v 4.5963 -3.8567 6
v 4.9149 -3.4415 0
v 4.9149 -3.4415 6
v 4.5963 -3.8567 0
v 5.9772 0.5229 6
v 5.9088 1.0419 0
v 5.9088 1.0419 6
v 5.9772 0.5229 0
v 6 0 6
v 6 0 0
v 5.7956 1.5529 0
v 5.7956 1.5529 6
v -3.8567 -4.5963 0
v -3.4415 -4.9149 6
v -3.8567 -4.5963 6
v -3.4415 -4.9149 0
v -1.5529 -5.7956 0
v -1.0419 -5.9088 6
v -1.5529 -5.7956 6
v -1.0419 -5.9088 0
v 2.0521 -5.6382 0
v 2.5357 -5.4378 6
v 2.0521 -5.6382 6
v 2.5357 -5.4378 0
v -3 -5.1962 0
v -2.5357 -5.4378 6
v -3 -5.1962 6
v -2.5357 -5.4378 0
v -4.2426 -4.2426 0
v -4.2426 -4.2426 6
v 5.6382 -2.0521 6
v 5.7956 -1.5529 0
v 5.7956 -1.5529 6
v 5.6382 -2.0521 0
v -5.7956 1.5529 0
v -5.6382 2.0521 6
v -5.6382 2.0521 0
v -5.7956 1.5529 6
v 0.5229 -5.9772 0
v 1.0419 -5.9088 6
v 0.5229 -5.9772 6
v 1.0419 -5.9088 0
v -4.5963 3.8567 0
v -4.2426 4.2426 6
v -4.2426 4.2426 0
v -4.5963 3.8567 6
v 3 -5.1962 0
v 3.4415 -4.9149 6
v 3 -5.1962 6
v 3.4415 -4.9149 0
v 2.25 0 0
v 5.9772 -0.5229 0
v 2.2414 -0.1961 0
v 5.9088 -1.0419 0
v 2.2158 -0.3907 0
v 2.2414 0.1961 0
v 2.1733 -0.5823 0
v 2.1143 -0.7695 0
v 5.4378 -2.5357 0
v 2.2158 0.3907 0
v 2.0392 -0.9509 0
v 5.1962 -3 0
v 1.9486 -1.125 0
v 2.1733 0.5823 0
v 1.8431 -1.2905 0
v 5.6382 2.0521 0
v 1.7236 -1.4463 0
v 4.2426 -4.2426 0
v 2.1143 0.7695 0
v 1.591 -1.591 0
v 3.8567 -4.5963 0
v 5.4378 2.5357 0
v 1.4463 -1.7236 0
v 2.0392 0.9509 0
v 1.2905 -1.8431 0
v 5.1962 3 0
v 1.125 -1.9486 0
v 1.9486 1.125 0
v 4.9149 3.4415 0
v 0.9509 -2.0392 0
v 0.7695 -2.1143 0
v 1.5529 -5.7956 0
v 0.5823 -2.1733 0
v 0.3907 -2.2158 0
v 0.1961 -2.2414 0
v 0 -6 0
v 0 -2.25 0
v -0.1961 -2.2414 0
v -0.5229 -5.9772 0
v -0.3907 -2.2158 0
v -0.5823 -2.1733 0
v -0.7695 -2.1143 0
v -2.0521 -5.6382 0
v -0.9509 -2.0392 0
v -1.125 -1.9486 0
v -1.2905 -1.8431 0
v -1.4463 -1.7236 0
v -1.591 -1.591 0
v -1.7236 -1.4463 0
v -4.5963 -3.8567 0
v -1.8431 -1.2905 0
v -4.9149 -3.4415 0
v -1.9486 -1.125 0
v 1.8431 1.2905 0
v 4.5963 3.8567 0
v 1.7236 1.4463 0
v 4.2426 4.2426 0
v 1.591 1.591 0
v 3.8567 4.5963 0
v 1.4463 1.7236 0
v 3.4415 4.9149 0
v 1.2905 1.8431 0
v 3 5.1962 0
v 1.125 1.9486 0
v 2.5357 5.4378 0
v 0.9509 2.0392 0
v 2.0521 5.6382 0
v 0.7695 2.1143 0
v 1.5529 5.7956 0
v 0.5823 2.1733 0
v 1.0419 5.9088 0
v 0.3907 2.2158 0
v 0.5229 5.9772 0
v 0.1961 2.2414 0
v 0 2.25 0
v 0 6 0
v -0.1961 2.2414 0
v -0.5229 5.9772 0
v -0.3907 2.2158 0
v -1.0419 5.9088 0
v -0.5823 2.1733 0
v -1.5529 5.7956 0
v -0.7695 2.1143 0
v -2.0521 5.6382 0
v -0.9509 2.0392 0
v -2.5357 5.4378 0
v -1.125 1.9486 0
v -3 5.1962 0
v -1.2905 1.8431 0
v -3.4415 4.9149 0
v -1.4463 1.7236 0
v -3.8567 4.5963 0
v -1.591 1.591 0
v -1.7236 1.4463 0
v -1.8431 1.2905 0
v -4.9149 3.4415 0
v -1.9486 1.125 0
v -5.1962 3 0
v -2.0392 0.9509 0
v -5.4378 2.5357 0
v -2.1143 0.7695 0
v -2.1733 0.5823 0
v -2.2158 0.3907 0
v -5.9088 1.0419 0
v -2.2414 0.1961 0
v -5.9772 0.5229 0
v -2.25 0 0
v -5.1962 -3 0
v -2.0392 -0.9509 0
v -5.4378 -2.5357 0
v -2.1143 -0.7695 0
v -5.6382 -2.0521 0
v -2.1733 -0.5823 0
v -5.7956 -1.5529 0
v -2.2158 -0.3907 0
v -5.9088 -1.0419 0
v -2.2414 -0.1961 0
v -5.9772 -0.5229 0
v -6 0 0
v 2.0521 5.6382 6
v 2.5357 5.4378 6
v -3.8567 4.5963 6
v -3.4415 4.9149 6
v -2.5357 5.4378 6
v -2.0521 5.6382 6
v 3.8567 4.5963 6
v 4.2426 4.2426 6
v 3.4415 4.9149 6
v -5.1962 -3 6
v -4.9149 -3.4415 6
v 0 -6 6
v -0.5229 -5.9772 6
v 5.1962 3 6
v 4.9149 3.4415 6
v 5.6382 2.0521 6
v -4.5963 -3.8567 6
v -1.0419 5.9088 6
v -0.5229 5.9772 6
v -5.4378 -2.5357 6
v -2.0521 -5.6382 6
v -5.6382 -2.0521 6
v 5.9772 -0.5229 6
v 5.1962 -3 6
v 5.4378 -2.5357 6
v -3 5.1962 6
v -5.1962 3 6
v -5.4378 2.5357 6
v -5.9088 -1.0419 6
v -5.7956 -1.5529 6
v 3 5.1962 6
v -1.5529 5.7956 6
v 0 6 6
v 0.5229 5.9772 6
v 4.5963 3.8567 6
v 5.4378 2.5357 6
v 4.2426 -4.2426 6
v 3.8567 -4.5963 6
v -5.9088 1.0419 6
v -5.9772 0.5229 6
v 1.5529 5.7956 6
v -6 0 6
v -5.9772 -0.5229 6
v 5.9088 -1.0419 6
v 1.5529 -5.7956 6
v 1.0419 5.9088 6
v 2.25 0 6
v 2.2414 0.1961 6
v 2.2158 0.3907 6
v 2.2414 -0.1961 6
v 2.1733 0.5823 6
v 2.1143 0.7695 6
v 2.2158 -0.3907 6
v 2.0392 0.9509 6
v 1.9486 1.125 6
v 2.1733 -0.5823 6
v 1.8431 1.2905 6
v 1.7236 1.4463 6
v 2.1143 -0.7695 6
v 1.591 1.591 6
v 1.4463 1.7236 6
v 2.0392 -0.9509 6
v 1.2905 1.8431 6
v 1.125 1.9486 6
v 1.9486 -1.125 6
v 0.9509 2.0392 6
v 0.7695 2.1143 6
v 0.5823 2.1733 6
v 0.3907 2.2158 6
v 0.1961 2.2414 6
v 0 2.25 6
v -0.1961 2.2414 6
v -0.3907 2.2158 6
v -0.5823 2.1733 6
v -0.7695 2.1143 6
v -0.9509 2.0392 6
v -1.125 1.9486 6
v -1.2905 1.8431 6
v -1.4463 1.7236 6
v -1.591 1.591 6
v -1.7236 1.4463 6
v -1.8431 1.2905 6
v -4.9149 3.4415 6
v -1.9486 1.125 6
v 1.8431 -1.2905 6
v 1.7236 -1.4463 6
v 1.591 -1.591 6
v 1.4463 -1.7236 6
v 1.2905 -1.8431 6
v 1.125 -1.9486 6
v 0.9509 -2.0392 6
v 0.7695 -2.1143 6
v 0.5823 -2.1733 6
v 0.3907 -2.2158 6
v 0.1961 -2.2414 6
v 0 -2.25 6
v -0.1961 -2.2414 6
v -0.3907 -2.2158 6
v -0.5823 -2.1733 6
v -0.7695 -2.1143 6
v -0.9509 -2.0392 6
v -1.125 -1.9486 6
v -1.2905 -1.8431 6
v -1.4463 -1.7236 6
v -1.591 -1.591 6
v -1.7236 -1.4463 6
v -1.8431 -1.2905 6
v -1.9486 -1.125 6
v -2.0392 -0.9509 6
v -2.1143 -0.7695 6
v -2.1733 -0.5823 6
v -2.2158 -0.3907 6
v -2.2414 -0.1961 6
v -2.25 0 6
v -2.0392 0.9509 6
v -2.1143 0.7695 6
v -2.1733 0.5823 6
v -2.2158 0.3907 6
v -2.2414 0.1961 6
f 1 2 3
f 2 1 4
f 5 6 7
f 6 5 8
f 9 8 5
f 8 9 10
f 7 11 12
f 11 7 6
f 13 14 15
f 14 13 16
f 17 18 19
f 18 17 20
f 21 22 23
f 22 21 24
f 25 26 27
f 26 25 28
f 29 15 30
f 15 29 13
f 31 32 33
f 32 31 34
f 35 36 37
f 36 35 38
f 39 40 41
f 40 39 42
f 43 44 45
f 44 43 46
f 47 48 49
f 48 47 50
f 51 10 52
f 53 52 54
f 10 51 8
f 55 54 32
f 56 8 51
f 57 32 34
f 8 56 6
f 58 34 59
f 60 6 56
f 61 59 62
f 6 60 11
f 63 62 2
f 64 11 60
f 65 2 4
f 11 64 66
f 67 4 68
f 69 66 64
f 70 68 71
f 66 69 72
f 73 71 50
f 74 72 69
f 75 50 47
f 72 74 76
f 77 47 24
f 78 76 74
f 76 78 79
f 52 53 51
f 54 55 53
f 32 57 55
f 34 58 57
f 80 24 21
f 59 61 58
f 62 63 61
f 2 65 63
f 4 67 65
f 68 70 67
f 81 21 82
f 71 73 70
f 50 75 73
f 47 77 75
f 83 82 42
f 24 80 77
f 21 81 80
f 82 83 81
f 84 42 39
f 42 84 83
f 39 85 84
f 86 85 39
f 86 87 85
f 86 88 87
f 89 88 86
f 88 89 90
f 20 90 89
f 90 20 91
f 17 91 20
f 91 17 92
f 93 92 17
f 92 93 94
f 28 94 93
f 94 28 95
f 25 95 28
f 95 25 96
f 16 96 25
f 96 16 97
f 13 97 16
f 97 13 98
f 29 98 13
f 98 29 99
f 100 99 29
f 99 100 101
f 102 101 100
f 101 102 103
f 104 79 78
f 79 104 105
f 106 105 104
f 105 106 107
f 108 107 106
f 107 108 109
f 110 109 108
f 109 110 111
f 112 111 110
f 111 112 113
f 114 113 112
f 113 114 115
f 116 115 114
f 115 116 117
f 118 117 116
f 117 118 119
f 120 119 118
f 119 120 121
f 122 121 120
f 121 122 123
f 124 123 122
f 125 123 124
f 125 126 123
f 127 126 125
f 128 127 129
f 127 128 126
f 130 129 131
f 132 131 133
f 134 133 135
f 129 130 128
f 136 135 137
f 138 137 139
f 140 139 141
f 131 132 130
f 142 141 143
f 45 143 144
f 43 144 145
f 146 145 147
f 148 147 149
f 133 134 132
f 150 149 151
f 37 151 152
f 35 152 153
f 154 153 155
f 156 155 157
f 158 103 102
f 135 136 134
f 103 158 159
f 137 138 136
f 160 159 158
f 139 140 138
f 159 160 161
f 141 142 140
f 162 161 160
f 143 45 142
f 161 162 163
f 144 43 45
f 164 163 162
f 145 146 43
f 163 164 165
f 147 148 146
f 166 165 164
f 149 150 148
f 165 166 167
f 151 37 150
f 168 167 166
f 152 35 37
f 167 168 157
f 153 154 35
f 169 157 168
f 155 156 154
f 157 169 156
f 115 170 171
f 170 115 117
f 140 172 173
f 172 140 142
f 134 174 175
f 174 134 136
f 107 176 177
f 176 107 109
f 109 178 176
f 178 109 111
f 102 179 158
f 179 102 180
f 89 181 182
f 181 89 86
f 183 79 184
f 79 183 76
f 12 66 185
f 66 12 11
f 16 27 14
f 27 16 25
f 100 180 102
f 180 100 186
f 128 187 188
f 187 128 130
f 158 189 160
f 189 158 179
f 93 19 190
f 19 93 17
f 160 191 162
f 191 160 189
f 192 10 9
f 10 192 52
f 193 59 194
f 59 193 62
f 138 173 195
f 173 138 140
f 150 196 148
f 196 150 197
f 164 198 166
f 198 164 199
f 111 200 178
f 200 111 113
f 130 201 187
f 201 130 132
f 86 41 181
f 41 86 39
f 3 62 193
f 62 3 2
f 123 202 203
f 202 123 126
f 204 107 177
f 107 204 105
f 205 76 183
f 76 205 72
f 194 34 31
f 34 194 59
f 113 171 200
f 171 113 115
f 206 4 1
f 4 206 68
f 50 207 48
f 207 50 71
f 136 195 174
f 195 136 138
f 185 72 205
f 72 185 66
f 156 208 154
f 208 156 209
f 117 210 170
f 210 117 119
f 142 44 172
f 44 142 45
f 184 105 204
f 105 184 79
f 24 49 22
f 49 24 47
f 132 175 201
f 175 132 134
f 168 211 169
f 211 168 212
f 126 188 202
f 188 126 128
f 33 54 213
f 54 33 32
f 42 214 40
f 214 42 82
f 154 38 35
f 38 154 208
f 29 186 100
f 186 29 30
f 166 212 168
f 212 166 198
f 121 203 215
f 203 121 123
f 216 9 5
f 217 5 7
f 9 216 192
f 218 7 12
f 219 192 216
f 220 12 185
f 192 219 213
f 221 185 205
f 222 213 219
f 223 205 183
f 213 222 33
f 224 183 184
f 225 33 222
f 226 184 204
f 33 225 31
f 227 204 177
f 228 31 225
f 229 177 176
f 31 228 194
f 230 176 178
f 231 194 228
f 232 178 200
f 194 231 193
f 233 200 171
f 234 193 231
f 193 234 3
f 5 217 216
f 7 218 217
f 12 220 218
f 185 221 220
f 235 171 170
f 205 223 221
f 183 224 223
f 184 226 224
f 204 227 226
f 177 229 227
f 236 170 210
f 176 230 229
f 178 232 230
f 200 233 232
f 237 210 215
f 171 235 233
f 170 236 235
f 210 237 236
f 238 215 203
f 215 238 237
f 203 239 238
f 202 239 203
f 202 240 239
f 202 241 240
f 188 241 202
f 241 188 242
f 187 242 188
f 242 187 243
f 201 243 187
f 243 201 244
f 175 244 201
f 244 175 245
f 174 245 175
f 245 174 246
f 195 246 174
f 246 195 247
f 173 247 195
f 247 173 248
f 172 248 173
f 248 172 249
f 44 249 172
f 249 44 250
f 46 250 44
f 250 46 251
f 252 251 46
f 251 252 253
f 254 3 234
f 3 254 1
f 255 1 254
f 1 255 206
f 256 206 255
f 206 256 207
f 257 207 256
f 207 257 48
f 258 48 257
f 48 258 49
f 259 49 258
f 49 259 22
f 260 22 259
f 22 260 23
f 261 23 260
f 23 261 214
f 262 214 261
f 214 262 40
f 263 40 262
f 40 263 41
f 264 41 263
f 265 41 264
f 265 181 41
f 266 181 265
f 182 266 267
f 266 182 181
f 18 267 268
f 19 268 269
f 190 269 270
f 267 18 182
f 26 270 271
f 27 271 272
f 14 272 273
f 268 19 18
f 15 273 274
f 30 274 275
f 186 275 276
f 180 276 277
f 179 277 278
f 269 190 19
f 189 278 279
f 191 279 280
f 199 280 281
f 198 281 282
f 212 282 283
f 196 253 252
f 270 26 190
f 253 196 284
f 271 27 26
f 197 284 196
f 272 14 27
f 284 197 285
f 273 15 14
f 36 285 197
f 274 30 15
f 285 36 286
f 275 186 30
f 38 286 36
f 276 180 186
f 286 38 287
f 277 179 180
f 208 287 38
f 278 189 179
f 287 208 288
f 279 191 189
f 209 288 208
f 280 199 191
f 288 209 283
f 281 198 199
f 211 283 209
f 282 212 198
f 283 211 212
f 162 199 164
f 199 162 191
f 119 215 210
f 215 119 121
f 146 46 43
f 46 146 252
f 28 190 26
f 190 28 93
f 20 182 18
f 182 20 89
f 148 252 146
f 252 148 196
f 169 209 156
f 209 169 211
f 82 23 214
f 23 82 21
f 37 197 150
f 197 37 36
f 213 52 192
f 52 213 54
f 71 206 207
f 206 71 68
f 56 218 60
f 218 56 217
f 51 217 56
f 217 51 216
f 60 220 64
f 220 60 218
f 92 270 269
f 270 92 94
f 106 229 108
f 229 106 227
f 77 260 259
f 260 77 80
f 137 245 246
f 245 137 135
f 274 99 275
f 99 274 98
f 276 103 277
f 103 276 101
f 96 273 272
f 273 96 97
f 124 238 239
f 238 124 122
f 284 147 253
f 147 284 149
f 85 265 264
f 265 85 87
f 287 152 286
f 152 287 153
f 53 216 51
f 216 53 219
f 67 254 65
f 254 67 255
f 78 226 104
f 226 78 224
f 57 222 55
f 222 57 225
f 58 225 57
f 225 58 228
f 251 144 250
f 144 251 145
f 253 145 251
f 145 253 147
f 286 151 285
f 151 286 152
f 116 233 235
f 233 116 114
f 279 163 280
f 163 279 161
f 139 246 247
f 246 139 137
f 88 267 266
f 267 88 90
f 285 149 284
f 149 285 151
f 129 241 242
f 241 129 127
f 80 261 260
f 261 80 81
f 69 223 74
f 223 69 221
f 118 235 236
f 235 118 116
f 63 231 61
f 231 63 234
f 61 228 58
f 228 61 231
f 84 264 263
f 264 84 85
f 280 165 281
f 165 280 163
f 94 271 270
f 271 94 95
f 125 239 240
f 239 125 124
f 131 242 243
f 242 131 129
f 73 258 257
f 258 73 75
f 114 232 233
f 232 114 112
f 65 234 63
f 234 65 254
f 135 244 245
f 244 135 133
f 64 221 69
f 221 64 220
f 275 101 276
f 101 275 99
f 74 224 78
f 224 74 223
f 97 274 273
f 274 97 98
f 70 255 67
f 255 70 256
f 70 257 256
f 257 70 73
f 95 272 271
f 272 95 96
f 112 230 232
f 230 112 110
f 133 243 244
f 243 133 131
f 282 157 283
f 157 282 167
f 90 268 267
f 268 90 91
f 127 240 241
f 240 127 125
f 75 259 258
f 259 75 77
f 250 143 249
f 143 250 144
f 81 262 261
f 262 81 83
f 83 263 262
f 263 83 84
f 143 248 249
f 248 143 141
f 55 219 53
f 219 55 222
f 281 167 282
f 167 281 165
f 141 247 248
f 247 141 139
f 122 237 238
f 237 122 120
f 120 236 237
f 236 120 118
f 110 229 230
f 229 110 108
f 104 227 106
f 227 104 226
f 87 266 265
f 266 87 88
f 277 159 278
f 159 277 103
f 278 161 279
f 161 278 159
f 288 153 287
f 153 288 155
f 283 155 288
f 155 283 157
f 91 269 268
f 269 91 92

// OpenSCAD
// Forge catalog: spacer / washer / standoff
outer_dia = 12;  // outer diameter (mm)
inner_dia = 4.5; // hole diameter (mm), 0 = solid
height    = 6;   // height (mm)
$fn = 72;
difference() {
    cylinder(d = outer_dia, h = height);
    if (inner_dia > 0) translate([0, 0, -1]) cylinder(d = inner_dia, h = height + 2);
}
